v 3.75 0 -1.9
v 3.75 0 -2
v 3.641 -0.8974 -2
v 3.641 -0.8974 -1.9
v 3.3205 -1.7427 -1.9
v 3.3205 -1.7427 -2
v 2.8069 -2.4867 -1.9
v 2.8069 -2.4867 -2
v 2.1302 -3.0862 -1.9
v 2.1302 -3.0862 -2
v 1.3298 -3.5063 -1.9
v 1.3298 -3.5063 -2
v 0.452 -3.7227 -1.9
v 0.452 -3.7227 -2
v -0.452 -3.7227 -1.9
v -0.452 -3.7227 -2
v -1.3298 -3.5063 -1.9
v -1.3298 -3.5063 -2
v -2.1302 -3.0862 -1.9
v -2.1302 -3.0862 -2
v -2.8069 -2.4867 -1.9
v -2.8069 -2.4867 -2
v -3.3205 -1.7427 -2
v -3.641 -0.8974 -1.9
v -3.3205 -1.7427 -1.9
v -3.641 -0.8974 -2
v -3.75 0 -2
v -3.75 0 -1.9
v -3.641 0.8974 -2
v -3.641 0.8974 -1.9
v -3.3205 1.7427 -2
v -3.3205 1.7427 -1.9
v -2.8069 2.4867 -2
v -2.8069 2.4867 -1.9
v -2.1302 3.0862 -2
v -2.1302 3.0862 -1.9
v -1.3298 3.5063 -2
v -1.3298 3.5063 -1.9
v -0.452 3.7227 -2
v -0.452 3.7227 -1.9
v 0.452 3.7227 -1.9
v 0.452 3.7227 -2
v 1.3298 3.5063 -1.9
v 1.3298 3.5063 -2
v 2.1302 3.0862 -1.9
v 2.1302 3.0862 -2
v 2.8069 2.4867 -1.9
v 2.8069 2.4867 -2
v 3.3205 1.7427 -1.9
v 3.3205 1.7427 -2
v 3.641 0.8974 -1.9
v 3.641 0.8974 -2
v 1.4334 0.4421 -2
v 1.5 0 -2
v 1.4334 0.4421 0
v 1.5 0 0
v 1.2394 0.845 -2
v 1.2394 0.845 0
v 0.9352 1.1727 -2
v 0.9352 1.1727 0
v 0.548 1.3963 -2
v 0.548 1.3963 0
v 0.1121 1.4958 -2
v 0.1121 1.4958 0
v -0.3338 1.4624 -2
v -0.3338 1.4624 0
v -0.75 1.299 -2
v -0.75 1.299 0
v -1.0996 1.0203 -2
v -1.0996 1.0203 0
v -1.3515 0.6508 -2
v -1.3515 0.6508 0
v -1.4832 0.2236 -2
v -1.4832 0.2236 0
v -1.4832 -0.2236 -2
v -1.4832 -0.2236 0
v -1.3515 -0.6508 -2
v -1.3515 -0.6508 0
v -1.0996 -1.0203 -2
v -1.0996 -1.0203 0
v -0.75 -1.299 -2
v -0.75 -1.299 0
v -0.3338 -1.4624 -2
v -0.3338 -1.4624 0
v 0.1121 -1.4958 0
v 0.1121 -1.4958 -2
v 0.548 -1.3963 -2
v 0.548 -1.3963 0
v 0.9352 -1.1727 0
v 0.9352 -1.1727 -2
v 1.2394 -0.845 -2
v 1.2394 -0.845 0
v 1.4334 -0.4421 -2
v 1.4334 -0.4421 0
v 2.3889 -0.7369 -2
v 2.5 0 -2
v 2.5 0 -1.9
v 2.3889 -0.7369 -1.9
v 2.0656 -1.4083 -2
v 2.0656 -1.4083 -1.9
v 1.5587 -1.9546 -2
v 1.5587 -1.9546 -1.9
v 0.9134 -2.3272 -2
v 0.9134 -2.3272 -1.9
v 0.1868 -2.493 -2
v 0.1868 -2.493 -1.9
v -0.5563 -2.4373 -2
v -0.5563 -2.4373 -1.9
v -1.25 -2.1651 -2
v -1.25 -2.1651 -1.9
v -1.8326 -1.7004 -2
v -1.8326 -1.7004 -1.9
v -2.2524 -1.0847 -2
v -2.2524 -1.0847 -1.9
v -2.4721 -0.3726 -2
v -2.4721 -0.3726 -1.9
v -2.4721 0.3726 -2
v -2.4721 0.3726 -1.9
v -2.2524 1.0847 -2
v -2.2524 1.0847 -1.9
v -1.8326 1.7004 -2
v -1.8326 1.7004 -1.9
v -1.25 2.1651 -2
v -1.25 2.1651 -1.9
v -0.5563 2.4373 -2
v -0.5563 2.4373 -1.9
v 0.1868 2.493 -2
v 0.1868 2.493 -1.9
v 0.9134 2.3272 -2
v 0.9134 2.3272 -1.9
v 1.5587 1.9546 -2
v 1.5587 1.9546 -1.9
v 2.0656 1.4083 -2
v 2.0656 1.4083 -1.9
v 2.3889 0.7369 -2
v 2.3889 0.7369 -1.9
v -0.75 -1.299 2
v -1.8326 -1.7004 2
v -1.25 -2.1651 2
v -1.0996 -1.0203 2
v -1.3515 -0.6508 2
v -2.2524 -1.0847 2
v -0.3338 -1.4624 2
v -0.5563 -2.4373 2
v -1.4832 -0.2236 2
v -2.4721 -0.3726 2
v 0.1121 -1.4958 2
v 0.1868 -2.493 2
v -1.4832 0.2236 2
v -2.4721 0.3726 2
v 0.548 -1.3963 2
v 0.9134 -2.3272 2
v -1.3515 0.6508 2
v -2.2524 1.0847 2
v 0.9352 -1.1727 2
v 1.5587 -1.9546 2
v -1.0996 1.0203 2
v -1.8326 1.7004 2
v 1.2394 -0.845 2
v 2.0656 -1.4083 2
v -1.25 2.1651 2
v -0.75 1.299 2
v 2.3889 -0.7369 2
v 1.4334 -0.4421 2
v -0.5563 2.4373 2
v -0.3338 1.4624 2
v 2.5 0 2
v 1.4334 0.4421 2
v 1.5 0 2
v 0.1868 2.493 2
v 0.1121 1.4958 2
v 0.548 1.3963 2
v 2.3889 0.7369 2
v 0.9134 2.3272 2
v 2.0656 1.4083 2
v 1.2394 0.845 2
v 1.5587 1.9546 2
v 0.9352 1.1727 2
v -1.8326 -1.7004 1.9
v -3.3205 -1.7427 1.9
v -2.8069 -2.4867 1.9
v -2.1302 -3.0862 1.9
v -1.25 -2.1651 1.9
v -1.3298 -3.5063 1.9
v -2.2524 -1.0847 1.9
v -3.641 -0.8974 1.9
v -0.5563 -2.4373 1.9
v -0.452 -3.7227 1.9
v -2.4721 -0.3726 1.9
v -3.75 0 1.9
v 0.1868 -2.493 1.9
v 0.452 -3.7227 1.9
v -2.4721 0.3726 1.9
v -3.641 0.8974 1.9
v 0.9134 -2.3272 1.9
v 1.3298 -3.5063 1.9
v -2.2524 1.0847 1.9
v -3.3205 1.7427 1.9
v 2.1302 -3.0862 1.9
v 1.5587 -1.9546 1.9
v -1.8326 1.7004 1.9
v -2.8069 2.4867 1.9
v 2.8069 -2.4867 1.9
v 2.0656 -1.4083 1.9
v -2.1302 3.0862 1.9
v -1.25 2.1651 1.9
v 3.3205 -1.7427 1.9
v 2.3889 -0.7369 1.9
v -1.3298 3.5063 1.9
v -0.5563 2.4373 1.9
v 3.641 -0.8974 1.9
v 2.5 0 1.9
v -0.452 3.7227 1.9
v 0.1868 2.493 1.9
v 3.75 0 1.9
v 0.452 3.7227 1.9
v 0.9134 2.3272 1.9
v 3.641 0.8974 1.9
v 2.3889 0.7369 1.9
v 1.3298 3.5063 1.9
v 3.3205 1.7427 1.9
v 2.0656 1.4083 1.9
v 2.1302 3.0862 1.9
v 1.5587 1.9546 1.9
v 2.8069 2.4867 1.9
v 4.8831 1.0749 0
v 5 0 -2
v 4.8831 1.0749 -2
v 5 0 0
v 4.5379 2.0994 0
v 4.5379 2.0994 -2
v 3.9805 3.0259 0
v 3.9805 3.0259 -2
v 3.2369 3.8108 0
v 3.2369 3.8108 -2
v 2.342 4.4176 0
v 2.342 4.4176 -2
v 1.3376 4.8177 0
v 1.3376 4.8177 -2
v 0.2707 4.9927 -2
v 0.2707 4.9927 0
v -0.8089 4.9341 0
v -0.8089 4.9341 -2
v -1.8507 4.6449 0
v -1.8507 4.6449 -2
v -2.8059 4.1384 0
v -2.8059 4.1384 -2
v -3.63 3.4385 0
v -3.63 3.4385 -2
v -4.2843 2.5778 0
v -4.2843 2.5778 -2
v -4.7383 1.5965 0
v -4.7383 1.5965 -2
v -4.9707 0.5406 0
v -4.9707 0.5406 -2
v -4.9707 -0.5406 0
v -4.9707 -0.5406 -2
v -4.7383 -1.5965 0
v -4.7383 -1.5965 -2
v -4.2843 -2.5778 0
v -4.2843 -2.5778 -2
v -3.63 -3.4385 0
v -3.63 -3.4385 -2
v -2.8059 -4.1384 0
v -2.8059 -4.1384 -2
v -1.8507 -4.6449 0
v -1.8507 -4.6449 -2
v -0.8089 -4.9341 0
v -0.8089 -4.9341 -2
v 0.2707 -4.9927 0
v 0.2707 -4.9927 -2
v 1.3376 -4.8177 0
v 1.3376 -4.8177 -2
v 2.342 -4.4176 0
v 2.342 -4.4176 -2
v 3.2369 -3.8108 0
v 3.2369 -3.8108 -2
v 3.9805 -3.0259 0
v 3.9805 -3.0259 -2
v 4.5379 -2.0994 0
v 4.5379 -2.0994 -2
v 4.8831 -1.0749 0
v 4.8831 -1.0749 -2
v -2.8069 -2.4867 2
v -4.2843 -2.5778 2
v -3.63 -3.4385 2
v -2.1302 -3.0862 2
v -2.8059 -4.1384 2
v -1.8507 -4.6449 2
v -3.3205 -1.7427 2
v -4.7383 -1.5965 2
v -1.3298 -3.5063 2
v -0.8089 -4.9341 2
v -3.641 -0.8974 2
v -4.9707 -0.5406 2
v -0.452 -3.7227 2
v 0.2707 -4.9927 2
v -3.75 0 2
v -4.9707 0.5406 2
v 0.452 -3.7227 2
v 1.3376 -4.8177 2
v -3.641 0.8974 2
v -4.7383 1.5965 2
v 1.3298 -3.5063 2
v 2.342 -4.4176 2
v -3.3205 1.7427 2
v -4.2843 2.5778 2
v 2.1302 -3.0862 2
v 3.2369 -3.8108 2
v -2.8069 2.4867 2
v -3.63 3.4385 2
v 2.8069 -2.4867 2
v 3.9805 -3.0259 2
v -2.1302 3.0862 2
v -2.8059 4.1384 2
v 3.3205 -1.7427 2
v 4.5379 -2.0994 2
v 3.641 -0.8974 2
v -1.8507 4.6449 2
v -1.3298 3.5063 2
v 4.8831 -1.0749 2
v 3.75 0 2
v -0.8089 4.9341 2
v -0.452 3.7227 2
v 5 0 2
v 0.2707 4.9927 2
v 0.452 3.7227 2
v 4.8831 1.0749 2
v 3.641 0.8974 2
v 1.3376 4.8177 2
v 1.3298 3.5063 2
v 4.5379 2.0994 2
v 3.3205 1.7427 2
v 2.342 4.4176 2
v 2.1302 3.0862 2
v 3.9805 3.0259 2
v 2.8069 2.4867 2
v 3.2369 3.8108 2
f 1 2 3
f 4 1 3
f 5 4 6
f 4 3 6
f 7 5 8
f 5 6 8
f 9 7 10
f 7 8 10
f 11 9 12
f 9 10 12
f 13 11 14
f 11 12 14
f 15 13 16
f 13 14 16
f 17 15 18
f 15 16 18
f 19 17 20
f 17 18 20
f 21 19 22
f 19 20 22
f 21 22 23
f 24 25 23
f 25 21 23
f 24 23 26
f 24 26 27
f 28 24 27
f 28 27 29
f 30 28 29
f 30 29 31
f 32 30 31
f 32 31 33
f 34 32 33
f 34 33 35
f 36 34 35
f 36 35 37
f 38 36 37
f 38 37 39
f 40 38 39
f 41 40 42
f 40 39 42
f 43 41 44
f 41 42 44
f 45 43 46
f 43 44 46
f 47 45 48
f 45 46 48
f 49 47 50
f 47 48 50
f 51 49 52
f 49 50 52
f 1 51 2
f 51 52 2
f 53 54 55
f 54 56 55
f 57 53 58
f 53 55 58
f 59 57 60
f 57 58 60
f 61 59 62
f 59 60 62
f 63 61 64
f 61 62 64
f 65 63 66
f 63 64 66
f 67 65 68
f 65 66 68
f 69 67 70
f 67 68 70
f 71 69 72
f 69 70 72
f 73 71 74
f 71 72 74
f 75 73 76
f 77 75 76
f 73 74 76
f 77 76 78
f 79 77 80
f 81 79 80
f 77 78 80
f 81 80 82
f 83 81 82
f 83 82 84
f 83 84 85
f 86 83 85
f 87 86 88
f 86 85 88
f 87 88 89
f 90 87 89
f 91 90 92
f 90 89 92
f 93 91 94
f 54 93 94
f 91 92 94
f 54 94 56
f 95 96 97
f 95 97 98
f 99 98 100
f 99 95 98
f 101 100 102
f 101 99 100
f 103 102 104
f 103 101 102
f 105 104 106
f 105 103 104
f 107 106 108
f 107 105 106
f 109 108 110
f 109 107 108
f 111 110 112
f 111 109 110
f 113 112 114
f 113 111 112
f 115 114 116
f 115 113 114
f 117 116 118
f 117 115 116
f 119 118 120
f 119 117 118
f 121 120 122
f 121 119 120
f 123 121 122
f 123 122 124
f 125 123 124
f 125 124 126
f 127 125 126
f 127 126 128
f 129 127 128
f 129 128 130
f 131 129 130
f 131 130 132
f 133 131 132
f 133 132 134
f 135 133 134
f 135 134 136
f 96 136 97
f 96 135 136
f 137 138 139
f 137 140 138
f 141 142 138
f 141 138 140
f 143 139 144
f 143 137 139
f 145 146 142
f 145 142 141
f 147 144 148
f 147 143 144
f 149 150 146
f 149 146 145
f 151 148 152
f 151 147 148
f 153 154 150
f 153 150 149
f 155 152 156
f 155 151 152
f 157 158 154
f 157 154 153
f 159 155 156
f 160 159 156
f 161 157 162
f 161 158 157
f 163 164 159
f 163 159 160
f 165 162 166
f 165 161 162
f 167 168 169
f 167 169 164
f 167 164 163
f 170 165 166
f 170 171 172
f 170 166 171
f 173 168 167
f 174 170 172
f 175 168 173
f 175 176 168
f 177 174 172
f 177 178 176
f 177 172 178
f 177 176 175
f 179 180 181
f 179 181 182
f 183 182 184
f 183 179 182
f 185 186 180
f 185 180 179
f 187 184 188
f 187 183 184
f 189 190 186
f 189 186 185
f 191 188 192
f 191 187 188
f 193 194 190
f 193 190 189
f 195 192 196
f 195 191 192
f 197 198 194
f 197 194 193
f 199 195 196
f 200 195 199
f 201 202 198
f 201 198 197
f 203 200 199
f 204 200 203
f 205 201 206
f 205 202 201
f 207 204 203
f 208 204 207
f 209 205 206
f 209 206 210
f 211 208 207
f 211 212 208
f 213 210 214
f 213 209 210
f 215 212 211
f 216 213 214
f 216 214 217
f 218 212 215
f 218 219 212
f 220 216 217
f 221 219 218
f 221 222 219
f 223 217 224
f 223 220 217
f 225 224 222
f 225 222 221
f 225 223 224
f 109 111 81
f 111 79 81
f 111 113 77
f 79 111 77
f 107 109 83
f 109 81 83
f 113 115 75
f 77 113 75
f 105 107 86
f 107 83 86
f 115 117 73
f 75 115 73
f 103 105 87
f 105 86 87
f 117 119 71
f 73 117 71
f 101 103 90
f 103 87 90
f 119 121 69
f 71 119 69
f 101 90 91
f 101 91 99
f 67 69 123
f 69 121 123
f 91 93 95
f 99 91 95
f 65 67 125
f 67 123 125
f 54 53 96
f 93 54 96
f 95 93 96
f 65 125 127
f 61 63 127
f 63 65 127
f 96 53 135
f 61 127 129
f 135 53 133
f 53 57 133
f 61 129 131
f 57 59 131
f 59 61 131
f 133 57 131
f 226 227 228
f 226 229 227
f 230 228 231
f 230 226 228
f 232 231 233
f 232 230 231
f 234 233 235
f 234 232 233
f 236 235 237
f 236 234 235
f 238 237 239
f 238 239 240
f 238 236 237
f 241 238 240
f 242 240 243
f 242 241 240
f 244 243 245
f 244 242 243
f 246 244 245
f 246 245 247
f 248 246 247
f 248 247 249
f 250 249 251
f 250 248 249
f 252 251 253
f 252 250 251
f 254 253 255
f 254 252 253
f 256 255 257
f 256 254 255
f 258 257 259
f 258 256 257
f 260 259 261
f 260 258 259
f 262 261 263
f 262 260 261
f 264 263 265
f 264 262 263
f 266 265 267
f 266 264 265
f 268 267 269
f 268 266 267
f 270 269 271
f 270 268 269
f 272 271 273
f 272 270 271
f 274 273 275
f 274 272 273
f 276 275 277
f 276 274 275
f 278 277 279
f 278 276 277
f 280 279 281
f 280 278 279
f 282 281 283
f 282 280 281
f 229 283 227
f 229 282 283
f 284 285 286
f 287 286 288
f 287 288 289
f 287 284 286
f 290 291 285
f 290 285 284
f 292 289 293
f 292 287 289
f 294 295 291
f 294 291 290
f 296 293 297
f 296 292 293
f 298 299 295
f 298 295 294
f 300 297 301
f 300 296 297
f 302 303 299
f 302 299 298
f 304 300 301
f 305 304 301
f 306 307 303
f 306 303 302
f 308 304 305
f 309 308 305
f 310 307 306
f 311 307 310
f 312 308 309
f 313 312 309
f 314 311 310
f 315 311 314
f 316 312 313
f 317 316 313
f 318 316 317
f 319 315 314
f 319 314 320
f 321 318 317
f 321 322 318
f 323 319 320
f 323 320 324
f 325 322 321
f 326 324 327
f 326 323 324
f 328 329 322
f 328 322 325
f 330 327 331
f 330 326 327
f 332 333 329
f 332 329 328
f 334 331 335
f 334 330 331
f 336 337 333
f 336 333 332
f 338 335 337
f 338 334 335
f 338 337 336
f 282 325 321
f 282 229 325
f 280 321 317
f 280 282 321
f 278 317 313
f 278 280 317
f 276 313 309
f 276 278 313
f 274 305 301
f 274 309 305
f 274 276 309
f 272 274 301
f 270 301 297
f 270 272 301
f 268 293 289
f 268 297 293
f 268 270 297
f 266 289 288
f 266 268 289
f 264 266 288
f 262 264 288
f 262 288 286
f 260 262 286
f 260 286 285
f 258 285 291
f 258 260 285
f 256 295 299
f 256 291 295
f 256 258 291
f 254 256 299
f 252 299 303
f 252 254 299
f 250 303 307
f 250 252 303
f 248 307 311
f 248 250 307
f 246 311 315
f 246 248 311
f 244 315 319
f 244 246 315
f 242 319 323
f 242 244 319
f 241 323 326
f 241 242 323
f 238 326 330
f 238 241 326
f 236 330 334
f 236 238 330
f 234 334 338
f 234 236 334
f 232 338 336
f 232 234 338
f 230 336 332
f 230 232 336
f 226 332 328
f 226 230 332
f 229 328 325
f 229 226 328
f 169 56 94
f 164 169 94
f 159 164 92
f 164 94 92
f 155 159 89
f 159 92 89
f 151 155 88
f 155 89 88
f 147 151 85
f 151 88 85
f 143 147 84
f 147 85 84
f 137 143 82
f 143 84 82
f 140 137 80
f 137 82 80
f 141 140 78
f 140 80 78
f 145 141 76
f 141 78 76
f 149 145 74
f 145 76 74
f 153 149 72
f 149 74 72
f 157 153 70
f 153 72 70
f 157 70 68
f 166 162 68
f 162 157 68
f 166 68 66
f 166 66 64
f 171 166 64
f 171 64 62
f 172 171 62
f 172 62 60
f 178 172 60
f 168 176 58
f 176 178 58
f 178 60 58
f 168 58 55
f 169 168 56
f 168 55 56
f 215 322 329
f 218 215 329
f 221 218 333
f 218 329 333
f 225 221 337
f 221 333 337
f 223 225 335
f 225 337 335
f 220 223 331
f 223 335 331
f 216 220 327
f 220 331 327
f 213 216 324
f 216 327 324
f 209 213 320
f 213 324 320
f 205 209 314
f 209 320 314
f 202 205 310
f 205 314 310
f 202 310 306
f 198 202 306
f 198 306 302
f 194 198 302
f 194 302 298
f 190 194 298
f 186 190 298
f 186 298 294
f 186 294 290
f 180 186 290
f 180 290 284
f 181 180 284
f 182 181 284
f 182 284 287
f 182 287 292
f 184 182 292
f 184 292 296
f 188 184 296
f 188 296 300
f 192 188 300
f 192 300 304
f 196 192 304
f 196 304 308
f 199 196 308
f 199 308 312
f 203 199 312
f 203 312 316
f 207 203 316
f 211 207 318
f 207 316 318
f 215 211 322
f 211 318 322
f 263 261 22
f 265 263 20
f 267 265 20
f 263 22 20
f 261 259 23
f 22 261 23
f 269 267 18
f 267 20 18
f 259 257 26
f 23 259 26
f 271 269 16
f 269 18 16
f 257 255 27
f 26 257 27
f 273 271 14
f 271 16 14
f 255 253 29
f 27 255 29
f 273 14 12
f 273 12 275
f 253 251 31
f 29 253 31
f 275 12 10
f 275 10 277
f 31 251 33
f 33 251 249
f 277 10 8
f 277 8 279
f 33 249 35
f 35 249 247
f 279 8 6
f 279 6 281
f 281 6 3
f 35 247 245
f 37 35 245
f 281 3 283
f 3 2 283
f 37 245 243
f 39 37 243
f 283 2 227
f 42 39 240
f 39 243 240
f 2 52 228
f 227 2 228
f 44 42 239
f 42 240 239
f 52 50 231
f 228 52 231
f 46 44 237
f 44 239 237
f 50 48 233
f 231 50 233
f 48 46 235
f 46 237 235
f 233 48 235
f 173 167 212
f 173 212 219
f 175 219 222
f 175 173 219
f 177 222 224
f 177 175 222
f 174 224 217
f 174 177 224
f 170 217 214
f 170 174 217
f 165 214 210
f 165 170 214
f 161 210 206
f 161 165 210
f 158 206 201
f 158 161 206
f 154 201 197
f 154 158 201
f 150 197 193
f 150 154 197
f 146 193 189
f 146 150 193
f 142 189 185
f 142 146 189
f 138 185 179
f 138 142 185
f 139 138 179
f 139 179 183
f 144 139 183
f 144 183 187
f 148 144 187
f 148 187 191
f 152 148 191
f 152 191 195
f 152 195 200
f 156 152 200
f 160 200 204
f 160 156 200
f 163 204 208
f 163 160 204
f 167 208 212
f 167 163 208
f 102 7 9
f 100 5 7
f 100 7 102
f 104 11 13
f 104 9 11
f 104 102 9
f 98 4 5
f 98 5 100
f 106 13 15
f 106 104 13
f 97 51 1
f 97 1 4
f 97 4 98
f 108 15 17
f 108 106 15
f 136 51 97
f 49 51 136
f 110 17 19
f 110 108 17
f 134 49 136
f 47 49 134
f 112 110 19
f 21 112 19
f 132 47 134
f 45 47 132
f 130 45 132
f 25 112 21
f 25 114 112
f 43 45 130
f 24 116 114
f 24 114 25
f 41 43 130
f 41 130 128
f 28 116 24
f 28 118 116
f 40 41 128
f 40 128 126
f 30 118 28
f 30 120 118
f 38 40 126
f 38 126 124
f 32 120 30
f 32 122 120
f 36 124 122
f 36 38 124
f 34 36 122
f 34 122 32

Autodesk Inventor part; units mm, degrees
ref_plane "YZ Plane" through (0, 0, 0) normal (1, 0, 0) x (0, 1, 0)
ref_plane "XZ Plane" through (0, 0, 0) normal (0, 1, 0) x (-1, 0, 0)
ref_plane "XY Plane" through (0, 0, 0) normal (0, 0, 1) x (1, 0, 0)
sketch "Sketch1" plane through (0, 0, 0) normal (0, 0, 1) x (1, 0, 0)
  circle A0 centre (0, 0) radius 1.5
  circle A1 centre (0, 0) radius 5
  dimension "d0" = 3
  dimension "d1" = 10
extrude "Extrusion1" add sketch "Sketch1" along normal mid plane 4
sketch "Sketch2" plane through (0, 0, 2) normal (0, 0, 1) x (1, 0, 0)
  circle A0 centre (0, 0) radius 1.5 projected
  circle A1 centre (0, 0) radius 5 projected
  circle A2 centre (0, 0) radius 3.75
  circle A3 centre (0, 0) radius 2.5
  dimension "d4" = 1.25
  dimension "d5" = 1
extrude "Extrusion2" cut sketch "Sketch2" against normal blind 0.1 contours A2
mirror "Mirror1" about plane through (0, 0, 0) normal (0, 0, 1) of "Extrusion2"
properties part number "idler bearing"
